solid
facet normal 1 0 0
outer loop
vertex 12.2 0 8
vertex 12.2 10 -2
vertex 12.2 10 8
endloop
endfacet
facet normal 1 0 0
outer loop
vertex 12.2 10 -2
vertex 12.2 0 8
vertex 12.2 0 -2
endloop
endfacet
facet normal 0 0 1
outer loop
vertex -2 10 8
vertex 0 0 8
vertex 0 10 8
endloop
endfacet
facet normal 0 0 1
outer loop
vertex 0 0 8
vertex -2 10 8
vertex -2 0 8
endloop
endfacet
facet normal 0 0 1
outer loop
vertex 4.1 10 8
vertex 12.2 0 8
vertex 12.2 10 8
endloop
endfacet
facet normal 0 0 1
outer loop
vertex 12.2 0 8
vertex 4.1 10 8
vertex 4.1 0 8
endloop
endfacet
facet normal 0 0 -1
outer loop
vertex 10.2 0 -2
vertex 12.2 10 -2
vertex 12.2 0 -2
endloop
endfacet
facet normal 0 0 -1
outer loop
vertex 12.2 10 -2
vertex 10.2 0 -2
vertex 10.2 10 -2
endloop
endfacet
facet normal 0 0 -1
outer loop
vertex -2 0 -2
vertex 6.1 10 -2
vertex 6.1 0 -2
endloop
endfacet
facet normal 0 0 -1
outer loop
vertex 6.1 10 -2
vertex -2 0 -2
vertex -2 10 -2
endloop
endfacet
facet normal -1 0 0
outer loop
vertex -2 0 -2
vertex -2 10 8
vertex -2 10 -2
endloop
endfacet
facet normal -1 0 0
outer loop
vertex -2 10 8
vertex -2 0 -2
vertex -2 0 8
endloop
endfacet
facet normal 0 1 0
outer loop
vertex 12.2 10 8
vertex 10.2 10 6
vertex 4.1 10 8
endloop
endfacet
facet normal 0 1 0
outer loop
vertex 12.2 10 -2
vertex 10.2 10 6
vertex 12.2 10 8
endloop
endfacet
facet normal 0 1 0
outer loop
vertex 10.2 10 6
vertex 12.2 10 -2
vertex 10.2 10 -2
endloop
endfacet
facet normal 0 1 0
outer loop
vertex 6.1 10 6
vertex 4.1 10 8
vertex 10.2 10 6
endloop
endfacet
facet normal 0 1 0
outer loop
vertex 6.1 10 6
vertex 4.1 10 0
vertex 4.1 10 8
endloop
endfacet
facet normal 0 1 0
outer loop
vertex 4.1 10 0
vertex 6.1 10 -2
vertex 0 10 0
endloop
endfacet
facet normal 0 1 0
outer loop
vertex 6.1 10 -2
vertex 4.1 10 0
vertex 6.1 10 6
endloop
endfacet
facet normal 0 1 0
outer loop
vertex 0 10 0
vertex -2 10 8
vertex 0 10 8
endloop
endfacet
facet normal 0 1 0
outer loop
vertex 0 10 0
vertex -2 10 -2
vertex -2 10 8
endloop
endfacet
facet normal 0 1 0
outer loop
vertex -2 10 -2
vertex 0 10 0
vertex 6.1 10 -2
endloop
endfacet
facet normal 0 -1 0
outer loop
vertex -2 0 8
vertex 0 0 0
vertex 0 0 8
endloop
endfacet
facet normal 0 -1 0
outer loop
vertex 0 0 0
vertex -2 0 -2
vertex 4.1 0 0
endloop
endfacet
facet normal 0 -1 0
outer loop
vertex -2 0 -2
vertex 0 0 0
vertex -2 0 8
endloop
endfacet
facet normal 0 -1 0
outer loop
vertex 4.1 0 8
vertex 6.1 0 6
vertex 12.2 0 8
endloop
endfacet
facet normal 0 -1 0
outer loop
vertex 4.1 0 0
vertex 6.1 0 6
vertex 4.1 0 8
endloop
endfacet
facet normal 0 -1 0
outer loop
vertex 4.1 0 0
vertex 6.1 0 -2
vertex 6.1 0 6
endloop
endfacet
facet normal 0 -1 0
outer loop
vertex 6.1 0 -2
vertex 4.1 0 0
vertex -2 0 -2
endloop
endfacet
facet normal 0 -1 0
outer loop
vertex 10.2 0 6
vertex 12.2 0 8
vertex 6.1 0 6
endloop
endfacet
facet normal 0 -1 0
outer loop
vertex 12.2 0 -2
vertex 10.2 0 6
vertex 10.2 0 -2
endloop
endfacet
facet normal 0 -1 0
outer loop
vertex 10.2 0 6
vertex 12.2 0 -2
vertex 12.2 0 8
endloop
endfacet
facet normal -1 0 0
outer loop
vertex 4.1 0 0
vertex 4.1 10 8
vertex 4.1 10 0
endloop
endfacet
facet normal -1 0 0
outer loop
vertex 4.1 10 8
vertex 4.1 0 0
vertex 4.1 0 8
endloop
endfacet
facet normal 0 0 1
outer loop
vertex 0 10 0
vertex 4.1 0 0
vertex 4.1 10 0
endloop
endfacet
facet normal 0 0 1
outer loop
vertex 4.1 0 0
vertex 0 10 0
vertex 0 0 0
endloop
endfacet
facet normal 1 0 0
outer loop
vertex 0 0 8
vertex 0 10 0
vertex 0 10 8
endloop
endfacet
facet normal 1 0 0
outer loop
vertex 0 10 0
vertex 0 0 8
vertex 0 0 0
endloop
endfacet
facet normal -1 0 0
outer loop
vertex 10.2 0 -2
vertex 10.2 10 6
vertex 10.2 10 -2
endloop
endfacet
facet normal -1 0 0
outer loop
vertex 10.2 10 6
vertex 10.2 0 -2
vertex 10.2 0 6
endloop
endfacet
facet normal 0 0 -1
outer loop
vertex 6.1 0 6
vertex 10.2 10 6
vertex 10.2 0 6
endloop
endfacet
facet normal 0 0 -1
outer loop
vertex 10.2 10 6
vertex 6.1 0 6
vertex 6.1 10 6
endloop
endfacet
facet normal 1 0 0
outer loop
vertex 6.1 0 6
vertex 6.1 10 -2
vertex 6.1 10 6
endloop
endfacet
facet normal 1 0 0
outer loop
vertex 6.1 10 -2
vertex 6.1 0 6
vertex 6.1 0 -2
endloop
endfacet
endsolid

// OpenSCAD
h = 4.1;
w = 2;

difference(){
    translate([-w,0,-w])cube([4.1+4.1+w+w+w,10,10]);
    #cube([4.1,10,10]);
    #translate([w+4.1,0,-w-w])cube([4.1,10,10]);
}
